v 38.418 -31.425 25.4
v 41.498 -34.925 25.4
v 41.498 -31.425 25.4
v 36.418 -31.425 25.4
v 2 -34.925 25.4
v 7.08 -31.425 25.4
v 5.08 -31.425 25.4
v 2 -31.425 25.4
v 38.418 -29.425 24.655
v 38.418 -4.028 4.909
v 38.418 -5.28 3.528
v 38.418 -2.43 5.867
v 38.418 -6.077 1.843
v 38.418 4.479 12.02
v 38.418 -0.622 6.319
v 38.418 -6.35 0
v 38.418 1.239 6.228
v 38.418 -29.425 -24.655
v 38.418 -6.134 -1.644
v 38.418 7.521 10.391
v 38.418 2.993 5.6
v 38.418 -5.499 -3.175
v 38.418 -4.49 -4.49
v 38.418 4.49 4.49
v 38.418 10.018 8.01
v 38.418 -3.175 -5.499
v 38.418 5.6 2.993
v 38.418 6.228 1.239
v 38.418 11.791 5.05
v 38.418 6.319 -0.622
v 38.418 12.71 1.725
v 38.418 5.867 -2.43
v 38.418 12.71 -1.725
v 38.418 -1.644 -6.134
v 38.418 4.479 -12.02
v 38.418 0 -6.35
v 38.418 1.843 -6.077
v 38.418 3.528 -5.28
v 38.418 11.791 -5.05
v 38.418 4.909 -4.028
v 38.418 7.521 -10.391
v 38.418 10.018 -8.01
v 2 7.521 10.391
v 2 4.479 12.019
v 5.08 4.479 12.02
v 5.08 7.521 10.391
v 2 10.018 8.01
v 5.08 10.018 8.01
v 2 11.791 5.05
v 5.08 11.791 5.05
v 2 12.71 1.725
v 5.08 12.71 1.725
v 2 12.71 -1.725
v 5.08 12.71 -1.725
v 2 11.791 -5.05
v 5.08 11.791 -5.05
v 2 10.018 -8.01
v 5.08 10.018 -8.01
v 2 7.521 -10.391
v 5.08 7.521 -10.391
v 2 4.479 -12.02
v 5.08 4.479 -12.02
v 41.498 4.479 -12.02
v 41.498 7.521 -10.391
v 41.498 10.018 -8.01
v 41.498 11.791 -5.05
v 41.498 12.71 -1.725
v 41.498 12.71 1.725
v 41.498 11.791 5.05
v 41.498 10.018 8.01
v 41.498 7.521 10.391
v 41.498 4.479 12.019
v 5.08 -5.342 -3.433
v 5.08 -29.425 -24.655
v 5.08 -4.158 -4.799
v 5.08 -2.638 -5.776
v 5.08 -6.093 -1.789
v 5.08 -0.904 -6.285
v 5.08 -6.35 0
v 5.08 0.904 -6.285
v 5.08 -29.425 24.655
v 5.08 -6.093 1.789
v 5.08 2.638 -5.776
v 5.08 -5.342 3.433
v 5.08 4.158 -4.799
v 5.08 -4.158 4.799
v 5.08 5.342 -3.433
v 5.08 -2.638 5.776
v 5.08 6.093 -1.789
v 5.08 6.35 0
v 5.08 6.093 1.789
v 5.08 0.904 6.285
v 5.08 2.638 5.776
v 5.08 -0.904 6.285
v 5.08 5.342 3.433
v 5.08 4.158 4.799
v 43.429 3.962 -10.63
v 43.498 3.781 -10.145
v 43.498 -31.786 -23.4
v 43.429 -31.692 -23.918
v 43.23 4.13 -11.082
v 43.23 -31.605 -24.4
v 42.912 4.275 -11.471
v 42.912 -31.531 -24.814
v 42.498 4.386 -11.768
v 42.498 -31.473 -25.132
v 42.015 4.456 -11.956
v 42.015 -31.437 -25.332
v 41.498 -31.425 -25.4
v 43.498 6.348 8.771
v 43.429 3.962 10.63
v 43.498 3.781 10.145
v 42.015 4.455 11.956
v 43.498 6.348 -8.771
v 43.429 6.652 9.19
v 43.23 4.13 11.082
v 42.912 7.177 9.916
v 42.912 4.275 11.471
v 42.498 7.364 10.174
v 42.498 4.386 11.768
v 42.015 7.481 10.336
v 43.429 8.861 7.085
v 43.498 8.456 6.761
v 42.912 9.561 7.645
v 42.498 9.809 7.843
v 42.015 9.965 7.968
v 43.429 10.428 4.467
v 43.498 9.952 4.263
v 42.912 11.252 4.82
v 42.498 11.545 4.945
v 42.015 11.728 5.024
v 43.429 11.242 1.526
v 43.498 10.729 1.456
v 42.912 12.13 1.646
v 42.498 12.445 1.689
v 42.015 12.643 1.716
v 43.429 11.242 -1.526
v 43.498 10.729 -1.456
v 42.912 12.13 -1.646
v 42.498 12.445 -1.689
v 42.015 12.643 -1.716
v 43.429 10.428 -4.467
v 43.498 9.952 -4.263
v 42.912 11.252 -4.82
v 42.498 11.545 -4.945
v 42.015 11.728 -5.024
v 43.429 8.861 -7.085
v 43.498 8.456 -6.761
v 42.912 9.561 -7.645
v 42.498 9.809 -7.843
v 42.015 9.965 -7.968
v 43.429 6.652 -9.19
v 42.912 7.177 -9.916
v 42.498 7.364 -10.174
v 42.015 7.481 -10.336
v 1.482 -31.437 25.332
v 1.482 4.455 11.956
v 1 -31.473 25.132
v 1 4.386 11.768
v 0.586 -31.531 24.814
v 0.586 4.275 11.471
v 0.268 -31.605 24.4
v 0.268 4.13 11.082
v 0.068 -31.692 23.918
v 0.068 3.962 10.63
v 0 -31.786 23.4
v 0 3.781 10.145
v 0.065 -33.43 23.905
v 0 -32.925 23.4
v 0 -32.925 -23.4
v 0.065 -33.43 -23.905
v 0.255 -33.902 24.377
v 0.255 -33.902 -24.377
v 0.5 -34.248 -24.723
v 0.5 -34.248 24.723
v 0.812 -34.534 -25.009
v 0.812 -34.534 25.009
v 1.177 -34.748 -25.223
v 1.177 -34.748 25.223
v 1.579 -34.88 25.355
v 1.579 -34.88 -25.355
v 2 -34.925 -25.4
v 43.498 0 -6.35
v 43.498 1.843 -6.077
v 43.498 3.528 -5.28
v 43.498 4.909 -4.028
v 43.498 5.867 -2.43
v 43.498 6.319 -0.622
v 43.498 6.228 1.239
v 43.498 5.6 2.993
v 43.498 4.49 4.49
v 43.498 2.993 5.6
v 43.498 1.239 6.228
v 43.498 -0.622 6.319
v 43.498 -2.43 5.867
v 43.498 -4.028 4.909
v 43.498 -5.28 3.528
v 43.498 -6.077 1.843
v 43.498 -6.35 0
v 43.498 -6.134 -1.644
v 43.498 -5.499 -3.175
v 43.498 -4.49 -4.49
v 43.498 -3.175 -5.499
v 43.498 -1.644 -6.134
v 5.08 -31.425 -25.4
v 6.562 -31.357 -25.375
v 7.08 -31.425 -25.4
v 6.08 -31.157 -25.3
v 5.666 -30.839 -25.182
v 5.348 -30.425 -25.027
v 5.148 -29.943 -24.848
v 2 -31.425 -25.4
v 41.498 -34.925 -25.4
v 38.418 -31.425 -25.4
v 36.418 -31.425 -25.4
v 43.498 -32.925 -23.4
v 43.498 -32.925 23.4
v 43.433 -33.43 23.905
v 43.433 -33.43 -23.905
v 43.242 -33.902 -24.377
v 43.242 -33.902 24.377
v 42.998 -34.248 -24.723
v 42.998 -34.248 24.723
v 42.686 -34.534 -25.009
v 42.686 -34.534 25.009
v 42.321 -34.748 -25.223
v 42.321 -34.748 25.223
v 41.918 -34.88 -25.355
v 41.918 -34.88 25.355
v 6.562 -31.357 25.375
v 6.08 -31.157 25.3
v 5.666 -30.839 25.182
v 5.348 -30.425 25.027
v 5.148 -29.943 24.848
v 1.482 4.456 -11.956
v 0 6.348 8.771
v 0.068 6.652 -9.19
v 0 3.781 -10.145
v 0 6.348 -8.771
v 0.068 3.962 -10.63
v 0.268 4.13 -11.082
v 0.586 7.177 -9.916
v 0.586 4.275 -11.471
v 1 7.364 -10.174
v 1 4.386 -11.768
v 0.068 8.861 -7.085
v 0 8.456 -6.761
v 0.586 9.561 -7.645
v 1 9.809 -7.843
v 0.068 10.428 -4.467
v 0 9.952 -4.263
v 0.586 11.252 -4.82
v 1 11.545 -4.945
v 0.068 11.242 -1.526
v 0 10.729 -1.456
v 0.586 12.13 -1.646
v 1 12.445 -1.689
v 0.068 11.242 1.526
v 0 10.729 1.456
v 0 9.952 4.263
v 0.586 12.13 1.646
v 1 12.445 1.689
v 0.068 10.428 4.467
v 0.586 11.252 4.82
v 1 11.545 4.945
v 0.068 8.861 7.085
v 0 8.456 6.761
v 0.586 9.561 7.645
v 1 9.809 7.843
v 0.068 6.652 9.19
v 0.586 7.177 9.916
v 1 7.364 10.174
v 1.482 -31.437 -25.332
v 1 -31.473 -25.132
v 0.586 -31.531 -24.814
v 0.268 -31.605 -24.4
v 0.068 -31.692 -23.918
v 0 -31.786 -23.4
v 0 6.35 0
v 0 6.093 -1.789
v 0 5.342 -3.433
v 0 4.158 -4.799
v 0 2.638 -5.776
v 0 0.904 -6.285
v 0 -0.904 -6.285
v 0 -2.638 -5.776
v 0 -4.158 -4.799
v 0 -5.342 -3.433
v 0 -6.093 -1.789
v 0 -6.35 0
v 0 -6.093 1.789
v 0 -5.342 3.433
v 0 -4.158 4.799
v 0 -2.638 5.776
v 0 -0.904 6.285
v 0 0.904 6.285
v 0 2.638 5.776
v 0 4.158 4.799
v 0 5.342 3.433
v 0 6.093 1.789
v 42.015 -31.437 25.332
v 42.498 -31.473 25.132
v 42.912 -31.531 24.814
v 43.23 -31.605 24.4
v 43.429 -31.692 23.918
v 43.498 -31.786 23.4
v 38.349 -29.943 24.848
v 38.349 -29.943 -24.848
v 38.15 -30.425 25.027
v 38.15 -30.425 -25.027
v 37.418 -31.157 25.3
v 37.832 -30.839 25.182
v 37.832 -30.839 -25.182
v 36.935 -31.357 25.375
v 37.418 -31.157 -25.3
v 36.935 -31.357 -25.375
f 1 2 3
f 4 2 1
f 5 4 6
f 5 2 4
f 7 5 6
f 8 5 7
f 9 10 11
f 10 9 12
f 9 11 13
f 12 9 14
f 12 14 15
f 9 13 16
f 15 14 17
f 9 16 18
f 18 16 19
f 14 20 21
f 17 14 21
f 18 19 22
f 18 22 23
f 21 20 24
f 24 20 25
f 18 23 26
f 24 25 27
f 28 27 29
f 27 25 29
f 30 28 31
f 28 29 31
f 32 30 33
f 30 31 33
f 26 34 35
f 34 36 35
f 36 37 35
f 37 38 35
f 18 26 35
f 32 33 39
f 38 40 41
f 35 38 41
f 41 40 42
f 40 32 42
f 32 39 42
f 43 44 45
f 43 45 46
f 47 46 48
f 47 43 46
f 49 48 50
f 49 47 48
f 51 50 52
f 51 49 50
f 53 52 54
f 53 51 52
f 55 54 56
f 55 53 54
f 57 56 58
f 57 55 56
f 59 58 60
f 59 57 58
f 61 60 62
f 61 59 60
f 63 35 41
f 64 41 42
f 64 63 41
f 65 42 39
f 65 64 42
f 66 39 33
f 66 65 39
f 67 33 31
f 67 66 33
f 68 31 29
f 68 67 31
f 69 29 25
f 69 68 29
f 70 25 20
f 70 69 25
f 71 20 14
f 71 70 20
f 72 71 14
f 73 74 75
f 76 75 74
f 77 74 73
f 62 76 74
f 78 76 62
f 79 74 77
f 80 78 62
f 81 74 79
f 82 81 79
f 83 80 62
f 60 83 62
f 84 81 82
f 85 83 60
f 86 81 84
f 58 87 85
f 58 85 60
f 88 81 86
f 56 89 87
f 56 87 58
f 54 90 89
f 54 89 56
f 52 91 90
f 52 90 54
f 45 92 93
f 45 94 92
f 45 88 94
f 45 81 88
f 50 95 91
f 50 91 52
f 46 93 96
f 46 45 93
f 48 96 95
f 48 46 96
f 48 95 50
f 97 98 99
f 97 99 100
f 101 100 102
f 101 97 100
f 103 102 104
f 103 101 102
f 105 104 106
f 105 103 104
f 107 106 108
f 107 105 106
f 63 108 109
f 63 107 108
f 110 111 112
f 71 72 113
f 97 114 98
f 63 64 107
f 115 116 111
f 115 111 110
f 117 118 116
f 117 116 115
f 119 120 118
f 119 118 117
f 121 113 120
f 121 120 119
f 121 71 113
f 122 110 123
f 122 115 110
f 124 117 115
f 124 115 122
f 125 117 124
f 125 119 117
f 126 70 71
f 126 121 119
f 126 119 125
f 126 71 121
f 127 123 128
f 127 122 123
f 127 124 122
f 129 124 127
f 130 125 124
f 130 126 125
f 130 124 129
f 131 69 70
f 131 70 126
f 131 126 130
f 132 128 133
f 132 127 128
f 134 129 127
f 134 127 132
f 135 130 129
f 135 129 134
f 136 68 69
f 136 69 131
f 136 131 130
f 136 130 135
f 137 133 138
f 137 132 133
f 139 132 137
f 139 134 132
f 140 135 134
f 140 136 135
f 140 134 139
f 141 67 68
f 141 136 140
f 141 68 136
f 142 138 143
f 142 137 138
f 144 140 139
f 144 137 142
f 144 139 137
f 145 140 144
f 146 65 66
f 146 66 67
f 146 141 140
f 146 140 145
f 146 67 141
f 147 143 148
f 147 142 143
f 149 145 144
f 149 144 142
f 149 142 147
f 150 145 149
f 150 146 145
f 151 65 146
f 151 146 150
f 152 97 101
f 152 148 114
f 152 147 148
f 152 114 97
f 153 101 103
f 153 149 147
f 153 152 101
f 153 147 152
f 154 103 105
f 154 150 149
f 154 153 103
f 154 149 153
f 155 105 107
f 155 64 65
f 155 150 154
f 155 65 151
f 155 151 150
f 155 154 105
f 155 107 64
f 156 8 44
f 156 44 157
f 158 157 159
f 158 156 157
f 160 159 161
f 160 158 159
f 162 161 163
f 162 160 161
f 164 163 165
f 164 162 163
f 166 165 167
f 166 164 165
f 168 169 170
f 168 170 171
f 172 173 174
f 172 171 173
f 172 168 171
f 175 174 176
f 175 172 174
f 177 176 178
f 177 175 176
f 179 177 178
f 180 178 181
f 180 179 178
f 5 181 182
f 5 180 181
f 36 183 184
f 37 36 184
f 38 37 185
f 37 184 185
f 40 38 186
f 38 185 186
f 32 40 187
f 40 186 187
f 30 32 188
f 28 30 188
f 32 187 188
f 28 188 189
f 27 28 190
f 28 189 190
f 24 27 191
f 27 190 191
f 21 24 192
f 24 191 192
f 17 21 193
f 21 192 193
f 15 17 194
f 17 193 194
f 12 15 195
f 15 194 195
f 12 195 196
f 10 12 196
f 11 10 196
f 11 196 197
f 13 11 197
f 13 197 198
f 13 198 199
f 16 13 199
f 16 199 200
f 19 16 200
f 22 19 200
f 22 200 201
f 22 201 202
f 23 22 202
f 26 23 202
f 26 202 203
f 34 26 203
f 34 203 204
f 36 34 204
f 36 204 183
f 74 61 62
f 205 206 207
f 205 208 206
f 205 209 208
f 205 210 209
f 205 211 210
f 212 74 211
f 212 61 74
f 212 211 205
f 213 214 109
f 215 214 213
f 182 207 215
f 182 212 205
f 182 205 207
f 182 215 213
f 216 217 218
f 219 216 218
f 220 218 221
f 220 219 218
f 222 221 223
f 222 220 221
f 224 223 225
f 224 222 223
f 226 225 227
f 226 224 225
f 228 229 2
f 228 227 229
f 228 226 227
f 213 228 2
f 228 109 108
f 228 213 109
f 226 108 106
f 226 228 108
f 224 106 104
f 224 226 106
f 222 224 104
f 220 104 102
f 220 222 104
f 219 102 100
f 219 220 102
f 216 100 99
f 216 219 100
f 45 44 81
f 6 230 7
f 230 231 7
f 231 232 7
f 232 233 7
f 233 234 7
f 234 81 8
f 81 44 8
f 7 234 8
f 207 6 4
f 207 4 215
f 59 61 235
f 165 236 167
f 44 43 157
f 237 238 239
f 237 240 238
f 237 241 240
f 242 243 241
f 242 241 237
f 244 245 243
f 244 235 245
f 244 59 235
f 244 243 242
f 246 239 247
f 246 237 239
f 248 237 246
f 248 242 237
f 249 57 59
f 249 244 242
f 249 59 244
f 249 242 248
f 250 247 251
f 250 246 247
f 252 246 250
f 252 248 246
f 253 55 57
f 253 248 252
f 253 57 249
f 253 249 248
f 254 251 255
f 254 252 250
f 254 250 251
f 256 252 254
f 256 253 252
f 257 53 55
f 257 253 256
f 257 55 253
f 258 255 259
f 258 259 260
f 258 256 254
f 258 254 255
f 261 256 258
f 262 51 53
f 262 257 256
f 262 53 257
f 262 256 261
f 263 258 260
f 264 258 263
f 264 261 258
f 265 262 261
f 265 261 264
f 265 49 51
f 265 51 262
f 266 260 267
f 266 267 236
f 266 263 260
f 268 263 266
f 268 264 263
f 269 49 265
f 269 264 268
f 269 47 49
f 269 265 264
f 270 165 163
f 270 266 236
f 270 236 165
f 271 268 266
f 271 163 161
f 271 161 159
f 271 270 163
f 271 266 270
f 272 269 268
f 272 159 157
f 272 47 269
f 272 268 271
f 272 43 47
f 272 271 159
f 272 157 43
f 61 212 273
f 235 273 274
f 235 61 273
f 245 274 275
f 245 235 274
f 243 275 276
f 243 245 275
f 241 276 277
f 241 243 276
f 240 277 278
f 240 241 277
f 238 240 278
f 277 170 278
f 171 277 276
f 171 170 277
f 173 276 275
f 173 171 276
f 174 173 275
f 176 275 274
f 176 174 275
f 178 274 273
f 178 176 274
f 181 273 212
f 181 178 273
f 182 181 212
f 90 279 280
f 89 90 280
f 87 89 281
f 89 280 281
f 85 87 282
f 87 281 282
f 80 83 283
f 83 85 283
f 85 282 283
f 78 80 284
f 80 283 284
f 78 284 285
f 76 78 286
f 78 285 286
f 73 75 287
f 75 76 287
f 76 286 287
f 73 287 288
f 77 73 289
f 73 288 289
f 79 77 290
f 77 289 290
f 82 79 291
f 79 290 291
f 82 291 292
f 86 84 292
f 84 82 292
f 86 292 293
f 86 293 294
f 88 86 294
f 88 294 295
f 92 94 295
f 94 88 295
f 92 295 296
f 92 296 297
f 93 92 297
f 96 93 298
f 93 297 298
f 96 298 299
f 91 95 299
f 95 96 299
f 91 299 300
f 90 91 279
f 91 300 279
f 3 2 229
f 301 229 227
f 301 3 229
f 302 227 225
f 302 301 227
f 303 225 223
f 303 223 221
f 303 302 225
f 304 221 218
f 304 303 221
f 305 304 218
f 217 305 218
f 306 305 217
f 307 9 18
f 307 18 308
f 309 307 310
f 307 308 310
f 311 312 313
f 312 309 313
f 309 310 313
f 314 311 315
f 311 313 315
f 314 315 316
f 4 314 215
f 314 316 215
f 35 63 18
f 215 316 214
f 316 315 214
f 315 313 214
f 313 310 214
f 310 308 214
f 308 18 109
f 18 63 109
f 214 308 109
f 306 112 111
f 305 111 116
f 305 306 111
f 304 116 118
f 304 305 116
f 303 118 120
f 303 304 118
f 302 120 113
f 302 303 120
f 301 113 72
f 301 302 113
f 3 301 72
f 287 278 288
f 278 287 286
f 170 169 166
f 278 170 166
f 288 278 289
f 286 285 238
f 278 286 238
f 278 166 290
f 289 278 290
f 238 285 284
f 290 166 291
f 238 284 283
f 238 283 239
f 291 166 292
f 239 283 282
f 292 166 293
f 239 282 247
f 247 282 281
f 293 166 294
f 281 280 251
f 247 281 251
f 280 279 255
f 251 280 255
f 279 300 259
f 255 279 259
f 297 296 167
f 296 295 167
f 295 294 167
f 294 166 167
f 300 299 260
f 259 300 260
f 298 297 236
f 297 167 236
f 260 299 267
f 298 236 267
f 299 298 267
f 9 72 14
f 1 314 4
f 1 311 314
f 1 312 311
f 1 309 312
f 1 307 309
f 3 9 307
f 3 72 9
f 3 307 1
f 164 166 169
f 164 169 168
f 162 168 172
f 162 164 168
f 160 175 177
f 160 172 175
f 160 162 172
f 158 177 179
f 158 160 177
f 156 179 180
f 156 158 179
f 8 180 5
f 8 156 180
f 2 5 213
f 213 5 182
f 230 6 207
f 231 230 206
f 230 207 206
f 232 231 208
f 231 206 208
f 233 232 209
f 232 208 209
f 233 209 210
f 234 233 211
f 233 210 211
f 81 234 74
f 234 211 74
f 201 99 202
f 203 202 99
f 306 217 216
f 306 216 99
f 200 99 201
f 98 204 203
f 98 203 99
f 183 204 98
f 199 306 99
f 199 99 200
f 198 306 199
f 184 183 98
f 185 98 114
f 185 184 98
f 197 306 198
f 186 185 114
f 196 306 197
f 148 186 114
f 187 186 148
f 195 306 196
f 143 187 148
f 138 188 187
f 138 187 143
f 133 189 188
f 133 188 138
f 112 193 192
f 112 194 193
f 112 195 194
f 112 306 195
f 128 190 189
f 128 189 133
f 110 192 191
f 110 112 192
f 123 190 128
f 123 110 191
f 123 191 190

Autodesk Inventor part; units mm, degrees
ref_plane "YZ Plane" through (0, 0, 0) normal (1, 0, 0) x (0, 1, 0)
ref_plane "XZ Plane" through (0, 0, 0) normal (0, 1, 0) x (-1, 0, 0)
ref_plane "XY Plane" through (0, 0, 0) normal (0, 0, 1) x (1, 0, 0)
sketch "Sketch1" plane through (0, 0, 0) normal (1, 0, 0) x (0, 1, 0)
  circle A0 centre (0, 0) radius 6.35
  line L0 (0, 0) -> (-34.925, 0)
  line L1 (-34.925, 25.4) -> (-34.925, -25.4)
  line L2 (-34.925, 25.4) -> (-31.425, 25.4)
  line L3 (-31.425, 25.4) -> (-31.425, -25.4)
  line L4 (-31.425, -25.4) -> (-34.925, -25.4)
  line L5 (-34.925, -25.4) -> (-34.925, 25.4)
  circle A1 centre (0, 0) radius 12.827
  line L6 (4.4793, 12.0195) -> (-31.425, 25.4)
  line L7 (4.4793, -12.0195) -> (-31.425, -25.4)
  dimension "d0" = 12.7
  dimension "d1" = 34.925
  dimension "d2" = 50.8
  dimension "d3" = 3.5
  dimension "d4" = 25.654
extrude "Extrusion1" add sketch "Sketch1" along normal blind 43.4975 contours L3 L4 L1 L0 | L0 L1 L2 L3
sketch "Sketch2" plane through (43.4975, 0, 0) normal (1, 0, 0) x (0, 0, -1)
  line L0 (-25.4, -34.925) -> (25.4, -34.925) projected
  line L1 (25.4, -34.925) -> (25.4, -31.425) projected
  line L2 (25.4, -31.425) -> (-25.4, -31.425) projected
  line L3 (-25.4, -31.425) -> (-25.4, -34.925) projected
  line L4 (-25.4, -31.425) -> (-25.4, -34.925) projected
  line L5 (-25.4, -34.925) -> (25.4, -34.925) projected
  line L6 (-25.4, -31.425) -> (-25.4, -34.925) projected
  line L7 (25.4, -31.425) -> (-25.4, -31.425) projected
  line L8 (25.4, -34.925) -> (25.4, -31.425) projected
  line L9 (-25.4, -31.425) -> (-25.4, -34.925) projected
  line L10 (-25.4, -31.425) -> (-25.4, -34.925) projected
  circle A0 centre (0, 0) radius 6.35 projected
  line L11 (0, 0) -> (0, -34.925) projected
  line L12 (-25.4, -34.925) -> (25.4, -34.925) projected
  line L13 (-25.4, -34.925) -> (-25.4, -31.425) projected
  line L14 (-25.4, -31.425) -> (25.4, -31.425) projected
  line L15 (25.4, -31.425) -> (25.4, -34.925) projected
  line L16 (25.4, -34.925) -> (-25.4, -34.925) projected
  circle A1 centre (0, 0) radius 12.827 projected
  line L17 (-12.0195, 4.4793) -> (-25.4, -31.425) projected
  line L18 (12.0195, 4.4793) -> (25.4, -31.425) projected
extrude "Extrusion2" add sketch "Sketch1" along normal blind 5.08 contours A1 | A1 L7 L3 L0 | L0 L3 L6 A1
extrude "Extrusion3" add sketch "Sketch2" against normal blind 5.08 contours L17 A1 L11 L2 | L11 A1 L18 L2 | A1
fillet "Fillet1" radius 2 14 edges at (43.4975, 12.827, 0) (43.4975, -13.4728, -18.7097) (43.4975, -13.4728, 18.7097) (0, 12.827, 0) (0, -13.4728, -18.7097) (0, -13.4728, 18.7097) (43.4975, -33.175, 25.4) (43.4975, -33.175, -25.4) (0, -33.175, 25.4) (0, -33.175, -25.4) (43.4975, -34.925, 0) (0, -34.925, 0) (38.4175, -31.425, 0) (5.08, -31.425, 0)
properties part number "largebracket"
